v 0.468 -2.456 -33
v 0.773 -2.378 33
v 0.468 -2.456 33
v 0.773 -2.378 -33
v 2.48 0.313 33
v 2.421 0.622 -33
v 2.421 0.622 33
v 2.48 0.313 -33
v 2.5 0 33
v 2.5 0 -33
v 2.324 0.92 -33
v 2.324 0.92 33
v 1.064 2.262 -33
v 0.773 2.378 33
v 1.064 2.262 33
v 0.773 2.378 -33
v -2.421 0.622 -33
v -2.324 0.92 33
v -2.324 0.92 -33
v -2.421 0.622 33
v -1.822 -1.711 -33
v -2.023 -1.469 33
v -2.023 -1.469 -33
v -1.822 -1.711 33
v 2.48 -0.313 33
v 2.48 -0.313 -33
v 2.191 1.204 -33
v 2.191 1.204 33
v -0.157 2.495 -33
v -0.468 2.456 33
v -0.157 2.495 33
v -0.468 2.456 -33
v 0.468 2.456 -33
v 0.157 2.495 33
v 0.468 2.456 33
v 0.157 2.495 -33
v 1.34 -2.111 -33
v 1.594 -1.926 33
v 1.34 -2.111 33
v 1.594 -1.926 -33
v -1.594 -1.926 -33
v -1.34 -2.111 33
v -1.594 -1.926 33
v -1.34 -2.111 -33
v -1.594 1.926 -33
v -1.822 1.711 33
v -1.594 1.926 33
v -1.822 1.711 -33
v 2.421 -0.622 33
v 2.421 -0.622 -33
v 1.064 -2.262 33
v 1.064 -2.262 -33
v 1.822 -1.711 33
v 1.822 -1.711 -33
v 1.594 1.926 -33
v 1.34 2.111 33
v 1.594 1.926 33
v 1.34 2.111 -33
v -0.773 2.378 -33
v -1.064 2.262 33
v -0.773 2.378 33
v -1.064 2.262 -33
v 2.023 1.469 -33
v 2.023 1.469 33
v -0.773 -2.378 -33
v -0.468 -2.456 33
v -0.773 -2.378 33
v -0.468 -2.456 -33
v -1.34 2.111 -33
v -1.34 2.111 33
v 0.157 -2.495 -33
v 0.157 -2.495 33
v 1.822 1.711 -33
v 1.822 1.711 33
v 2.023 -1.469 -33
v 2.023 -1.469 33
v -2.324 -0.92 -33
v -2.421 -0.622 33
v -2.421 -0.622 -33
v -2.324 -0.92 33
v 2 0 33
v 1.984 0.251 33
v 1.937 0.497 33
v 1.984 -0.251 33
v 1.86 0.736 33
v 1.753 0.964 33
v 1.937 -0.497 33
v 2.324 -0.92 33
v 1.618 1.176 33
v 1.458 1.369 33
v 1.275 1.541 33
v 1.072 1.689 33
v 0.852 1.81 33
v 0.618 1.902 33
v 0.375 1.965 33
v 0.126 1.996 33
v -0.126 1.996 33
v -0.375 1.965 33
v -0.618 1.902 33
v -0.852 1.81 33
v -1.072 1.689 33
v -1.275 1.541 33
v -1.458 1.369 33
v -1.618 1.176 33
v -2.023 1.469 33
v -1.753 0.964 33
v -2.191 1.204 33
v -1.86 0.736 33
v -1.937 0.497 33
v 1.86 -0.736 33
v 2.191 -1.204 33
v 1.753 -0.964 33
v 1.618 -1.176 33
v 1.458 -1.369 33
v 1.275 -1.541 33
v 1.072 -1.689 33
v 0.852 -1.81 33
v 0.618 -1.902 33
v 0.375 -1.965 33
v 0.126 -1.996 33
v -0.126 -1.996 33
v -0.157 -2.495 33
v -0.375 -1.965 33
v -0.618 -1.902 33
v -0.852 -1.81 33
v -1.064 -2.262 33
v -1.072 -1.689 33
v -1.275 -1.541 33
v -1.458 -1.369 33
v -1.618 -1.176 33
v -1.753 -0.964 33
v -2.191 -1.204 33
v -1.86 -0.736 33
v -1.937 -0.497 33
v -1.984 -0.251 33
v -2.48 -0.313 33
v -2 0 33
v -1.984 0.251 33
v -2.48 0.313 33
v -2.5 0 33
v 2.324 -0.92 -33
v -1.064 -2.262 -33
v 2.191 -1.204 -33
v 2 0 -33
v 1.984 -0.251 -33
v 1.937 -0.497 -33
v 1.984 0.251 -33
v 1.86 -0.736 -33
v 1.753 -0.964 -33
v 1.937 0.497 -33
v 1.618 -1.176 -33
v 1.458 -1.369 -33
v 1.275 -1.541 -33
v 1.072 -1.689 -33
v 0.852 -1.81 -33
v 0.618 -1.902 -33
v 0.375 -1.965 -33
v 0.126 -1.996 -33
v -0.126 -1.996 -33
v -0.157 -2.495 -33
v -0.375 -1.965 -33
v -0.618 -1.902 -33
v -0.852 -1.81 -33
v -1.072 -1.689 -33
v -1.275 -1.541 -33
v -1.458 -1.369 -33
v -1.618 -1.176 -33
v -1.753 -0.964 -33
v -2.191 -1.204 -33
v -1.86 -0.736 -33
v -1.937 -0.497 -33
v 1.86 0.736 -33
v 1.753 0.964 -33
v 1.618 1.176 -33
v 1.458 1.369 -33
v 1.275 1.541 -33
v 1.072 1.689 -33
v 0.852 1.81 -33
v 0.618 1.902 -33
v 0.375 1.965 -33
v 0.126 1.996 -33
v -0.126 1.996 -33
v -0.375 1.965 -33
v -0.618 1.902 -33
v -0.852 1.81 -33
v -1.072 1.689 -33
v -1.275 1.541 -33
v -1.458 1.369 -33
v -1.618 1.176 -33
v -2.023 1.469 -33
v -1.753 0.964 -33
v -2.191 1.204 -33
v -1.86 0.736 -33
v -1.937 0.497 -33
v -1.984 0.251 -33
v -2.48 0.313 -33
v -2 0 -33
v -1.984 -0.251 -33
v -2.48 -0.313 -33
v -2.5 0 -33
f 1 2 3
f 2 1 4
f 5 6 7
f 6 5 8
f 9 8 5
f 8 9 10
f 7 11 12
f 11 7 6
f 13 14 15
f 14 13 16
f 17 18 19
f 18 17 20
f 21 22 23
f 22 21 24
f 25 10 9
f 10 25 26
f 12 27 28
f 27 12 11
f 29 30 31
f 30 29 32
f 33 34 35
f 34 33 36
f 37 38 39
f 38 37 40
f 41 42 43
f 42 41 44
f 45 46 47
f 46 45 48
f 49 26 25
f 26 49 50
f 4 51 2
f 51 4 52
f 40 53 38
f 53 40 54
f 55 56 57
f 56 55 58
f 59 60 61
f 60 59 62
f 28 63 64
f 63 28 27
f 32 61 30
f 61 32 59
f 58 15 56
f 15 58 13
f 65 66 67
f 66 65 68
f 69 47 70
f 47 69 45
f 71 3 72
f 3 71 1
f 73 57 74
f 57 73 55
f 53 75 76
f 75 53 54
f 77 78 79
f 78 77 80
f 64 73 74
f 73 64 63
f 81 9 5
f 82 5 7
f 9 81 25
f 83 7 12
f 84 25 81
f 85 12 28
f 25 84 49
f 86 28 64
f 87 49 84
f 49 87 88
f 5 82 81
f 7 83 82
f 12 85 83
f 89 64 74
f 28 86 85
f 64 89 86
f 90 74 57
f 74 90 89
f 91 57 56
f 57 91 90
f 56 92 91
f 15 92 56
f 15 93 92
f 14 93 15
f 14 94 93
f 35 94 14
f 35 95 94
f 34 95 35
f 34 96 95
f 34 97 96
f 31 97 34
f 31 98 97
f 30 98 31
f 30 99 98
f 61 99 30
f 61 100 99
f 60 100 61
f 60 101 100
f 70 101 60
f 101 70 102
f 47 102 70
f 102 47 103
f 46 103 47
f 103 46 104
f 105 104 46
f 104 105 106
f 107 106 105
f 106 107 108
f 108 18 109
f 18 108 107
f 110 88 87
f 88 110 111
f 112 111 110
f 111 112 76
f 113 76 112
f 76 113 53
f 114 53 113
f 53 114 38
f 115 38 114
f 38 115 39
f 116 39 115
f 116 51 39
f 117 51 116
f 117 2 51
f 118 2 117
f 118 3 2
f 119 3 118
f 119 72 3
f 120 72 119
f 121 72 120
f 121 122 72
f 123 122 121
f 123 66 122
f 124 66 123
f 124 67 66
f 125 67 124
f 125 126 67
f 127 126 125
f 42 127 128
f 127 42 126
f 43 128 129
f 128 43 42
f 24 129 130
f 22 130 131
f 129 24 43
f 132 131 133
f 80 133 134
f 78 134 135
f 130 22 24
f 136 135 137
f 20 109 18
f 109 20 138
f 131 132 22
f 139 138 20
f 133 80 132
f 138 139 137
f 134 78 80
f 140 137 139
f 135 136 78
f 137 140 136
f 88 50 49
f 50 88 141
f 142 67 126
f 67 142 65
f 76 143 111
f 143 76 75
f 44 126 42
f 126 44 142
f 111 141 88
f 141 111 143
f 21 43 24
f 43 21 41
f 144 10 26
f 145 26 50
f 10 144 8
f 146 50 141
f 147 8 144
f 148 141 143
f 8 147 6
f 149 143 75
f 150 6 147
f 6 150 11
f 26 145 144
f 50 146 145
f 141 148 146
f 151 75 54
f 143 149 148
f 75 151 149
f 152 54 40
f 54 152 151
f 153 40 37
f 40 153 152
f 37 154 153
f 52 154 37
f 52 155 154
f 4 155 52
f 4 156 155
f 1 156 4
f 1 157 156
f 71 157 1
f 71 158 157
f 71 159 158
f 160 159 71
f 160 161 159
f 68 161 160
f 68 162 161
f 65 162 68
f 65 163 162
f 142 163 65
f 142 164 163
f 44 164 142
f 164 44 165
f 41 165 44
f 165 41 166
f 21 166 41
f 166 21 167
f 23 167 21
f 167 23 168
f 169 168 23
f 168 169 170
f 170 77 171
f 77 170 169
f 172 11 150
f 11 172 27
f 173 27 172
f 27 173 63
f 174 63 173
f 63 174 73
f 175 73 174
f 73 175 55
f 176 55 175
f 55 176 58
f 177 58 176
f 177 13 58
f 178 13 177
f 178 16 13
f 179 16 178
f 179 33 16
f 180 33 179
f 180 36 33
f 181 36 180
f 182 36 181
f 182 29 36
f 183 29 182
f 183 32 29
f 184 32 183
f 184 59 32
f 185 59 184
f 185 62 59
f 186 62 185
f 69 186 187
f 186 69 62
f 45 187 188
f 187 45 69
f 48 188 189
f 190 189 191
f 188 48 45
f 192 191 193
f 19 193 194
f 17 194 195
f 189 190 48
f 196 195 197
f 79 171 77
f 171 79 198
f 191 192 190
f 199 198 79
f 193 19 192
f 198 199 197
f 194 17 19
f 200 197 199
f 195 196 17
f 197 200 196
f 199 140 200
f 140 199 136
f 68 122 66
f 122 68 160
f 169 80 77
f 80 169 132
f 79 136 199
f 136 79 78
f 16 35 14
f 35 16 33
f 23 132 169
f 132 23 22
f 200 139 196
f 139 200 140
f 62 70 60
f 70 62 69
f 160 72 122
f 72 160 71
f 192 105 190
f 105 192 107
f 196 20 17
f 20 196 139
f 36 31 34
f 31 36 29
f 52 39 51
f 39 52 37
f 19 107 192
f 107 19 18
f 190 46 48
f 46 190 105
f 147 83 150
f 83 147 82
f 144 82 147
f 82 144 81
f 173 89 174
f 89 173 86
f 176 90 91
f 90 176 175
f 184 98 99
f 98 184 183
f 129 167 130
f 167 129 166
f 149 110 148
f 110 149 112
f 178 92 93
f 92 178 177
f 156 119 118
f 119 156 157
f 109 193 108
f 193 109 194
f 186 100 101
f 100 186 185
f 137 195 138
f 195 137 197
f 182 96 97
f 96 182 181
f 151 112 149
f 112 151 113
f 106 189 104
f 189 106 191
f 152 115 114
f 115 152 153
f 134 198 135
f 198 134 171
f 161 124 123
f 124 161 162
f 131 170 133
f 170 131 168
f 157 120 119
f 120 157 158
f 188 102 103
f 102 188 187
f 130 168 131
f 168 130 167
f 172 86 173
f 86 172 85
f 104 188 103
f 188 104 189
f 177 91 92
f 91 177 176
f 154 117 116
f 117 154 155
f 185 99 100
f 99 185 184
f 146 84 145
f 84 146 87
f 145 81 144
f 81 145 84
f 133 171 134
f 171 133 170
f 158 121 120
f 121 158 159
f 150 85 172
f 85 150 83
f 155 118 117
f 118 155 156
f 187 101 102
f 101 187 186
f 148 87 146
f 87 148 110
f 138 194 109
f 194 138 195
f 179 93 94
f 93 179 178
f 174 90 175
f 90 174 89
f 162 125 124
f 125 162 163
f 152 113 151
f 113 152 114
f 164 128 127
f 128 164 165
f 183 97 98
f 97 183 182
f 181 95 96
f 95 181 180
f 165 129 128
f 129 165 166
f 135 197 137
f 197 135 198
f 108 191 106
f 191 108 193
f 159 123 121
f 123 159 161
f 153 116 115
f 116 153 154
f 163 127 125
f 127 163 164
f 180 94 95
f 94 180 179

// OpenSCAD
$fn = 50;


difference() {
	union() {
		translate(v = [0, 0, -33.0000000000]) {
			cylinder(h = 66, r = 2.5000000000);
		}
	}
	union() {
		translate(v = [0, 0, -100.0000000000]) {
			cylinder(h = 200, r = 2.0000000000);
		}
	}
}
